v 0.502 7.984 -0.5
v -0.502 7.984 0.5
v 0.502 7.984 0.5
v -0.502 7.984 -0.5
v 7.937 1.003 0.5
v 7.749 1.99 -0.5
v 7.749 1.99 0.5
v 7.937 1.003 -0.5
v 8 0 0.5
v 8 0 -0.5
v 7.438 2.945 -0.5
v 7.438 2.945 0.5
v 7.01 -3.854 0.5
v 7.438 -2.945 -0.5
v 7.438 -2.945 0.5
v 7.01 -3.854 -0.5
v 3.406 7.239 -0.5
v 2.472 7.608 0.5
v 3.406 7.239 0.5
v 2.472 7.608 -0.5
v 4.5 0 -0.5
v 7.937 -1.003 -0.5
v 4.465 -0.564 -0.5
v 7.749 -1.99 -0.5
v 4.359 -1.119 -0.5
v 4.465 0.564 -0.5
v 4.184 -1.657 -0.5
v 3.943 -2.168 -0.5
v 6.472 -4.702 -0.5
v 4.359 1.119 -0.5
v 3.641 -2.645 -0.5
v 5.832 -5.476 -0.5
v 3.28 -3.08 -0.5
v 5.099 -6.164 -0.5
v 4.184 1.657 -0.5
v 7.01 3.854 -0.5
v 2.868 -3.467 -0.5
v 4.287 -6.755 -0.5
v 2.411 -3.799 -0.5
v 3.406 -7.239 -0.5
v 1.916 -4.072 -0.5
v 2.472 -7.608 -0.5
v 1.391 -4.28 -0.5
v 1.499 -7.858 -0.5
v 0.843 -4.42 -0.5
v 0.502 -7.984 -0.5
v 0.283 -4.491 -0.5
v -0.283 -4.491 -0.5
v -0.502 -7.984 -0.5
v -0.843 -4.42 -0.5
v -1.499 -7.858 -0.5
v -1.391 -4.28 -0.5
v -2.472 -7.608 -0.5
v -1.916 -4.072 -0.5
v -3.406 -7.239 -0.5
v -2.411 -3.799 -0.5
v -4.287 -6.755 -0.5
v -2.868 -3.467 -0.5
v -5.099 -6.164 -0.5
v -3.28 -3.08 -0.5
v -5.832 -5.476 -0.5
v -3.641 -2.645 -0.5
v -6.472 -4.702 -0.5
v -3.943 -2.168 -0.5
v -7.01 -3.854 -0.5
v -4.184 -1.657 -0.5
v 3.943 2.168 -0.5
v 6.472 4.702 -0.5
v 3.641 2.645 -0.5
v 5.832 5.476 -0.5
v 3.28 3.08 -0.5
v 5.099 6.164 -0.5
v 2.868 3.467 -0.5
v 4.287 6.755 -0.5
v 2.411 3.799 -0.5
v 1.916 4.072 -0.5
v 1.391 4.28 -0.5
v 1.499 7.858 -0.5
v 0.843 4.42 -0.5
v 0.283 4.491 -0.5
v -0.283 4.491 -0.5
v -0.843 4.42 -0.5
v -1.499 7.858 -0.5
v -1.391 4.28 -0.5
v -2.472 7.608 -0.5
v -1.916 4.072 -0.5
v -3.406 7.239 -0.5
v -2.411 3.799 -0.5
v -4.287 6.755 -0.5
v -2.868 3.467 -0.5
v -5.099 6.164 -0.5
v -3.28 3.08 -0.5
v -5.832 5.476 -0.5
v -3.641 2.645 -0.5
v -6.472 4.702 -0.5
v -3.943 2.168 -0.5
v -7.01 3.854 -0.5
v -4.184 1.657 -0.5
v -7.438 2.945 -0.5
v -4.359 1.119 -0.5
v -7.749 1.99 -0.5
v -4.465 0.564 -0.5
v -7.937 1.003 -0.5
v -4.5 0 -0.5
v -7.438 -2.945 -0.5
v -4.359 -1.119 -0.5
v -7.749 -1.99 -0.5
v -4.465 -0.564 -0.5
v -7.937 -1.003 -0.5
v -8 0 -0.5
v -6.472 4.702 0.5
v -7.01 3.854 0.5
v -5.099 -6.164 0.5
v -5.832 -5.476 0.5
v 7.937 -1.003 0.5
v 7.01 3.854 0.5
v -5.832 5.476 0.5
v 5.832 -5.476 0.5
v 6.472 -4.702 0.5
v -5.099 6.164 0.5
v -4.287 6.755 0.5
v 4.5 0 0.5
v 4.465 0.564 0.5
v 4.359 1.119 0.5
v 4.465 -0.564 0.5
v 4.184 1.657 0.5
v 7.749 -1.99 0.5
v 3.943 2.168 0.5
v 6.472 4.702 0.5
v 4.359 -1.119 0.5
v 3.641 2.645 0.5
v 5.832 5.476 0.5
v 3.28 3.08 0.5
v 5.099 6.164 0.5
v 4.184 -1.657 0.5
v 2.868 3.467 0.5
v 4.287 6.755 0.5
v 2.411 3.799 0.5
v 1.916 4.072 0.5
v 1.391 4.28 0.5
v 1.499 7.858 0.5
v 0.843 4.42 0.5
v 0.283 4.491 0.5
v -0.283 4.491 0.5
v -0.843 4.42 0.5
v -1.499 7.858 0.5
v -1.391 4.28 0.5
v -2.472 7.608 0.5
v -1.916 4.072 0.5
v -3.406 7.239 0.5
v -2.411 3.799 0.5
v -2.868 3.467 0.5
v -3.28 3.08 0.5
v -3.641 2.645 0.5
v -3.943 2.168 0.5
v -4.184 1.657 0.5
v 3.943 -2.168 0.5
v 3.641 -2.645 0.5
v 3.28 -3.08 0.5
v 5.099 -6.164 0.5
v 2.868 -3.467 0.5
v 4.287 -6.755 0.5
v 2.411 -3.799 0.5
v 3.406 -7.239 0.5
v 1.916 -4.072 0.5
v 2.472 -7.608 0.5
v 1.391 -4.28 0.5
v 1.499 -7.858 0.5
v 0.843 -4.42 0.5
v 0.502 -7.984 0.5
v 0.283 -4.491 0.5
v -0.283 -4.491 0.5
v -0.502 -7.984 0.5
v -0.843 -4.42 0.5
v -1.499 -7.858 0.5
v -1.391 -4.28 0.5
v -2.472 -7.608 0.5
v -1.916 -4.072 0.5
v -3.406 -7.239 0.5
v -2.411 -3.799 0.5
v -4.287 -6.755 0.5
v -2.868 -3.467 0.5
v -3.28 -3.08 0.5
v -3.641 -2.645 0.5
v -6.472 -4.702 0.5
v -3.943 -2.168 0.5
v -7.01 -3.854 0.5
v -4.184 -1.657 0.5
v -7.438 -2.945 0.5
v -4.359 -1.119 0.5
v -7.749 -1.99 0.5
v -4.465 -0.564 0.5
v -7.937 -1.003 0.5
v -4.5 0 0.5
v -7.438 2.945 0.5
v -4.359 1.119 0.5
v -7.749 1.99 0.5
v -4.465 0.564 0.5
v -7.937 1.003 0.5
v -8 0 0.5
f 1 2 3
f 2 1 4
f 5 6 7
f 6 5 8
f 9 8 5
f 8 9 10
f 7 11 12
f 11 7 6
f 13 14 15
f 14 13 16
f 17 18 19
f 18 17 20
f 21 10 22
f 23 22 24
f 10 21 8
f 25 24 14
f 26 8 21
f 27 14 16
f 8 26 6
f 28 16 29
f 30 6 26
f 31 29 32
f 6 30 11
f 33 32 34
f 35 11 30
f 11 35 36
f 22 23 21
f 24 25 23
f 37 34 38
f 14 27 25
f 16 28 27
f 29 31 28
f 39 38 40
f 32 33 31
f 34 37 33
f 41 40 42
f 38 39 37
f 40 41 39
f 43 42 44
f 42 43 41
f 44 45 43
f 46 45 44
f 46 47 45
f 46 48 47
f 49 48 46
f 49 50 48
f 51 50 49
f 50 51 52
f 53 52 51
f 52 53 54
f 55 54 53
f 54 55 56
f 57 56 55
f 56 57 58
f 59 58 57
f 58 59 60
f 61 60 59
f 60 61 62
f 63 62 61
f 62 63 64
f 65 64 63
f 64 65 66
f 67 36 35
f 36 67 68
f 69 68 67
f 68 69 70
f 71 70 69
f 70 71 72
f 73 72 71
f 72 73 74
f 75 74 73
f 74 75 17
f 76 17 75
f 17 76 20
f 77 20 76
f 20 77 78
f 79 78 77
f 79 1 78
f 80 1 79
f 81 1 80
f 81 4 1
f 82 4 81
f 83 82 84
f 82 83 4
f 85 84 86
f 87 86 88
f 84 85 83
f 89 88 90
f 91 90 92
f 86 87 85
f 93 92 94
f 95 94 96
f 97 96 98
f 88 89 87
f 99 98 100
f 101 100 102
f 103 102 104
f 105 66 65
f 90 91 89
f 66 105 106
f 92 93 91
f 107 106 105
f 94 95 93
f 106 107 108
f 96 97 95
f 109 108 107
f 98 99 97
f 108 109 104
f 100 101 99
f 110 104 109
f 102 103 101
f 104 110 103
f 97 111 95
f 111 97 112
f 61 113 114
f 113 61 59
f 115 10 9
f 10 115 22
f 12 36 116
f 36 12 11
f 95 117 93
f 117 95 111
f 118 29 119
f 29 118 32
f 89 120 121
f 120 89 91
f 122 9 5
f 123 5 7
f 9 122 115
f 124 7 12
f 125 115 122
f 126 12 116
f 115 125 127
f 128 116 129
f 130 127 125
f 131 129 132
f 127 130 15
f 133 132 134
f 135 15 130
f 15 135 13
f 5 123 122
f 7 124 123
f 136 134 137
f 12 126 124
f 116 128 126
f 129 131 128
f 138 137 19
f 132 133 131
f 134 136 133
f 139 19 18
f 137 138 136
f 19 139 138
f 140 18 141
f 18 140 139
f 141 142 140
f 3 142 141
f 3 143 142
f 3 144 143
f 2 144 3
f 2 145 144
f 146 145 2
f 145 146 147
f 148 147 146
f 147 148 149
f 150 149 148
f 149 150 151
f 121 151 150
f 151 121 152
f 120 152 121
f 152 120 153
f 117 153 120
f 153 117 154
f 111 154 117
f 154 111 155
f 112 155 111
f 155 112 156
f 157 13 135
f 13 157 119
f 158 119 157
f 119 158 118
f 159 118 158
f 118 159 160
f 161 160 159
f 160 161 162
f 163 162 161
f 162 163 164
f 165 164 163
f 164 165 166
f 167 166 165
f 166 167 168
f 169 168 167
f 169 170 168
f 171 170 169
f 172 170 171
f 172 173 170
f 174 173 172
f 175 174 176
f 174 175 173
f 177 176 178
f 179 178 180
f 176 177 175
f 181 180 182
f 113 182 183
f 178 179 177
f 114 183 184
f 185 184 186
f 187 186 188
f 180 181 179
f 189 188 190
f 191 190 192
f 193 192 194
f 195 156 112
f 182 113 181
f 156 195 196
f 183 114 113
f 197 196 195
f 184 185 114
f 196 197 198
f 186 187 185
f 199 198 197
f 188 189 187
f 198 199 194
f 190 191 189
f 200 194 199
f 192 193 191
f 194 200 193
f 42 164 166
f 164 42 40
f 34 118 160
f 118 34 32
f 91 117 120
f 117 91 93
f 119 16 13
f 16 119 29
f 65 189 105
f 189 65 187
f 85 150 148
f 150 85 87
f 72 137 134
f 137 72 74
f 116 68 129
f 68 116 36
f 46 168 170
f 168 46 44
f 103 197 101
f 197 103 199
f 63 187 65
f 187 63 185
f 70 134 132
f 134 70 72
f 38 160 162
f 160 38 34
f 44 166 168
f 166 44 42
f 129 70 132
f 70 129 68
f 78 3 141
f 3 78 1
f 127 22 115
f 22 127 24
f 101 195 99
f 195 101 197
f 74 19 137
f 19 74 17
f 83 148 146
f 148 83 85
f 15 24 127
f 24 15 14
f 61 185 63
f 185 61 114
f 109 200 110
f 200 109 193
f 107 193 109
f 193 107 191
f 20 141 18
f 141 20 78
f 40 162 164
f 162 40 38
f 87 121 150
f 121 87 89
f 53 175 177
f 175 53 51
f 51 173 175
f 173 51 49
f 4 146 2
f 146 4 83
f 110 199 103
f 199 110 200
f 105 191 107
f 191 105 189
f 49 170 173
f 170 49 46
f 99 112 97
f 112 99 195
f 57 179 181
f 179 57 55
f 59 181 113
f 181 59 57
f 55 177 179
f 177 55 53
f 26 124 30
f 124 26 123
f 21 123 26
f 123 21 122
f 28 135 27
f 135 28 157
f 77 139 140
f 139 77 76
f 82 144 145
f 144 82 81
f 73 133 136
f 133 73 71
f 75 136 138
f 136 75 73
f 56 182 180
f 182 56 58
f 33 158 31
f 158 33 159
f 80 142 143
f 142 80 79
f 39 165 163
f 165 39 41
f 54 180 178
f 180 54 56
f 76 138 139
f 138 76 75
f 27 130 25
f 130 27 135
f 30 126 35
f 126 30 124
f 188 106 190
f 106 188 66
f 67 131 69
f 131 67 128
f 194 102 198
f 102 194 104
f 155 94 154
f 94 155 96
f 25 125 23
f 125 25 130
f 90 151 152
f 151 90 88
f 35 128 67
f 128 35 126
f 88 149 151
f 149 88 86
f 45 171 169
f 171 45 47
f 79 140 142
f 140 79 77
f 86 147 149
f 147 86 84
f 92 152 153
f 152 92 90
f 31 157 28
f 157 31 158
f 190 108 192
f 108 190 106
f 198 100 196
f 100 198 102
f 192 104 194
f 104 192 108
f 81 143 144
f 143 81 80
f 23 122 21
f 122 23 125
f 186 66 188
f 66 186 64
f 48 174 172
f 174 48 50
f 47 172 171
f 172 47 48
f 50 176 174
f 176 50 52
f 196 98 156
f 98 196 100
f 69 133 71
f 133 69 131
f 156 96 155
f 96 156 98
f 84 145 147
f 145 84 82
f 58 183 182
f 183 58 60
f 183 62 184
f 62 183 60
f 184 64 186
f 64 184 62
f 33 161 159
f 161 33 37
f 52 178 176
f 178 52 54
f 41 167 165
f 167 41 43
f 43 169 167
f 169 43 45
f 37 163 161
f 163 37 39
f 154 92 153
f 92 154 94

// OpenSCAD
$fn = 50;


difference() {
	union() {
		translate(v = [0, 0, -0.5000000000]) {
			cylinder(h = 1, r = 8.0000000000);
		}
	}
	union() {
		translate(v = [0, 0, -100.0000000000]) {
			cylinder(h = 200, r = 4.5000000000);
		}
	}
}
